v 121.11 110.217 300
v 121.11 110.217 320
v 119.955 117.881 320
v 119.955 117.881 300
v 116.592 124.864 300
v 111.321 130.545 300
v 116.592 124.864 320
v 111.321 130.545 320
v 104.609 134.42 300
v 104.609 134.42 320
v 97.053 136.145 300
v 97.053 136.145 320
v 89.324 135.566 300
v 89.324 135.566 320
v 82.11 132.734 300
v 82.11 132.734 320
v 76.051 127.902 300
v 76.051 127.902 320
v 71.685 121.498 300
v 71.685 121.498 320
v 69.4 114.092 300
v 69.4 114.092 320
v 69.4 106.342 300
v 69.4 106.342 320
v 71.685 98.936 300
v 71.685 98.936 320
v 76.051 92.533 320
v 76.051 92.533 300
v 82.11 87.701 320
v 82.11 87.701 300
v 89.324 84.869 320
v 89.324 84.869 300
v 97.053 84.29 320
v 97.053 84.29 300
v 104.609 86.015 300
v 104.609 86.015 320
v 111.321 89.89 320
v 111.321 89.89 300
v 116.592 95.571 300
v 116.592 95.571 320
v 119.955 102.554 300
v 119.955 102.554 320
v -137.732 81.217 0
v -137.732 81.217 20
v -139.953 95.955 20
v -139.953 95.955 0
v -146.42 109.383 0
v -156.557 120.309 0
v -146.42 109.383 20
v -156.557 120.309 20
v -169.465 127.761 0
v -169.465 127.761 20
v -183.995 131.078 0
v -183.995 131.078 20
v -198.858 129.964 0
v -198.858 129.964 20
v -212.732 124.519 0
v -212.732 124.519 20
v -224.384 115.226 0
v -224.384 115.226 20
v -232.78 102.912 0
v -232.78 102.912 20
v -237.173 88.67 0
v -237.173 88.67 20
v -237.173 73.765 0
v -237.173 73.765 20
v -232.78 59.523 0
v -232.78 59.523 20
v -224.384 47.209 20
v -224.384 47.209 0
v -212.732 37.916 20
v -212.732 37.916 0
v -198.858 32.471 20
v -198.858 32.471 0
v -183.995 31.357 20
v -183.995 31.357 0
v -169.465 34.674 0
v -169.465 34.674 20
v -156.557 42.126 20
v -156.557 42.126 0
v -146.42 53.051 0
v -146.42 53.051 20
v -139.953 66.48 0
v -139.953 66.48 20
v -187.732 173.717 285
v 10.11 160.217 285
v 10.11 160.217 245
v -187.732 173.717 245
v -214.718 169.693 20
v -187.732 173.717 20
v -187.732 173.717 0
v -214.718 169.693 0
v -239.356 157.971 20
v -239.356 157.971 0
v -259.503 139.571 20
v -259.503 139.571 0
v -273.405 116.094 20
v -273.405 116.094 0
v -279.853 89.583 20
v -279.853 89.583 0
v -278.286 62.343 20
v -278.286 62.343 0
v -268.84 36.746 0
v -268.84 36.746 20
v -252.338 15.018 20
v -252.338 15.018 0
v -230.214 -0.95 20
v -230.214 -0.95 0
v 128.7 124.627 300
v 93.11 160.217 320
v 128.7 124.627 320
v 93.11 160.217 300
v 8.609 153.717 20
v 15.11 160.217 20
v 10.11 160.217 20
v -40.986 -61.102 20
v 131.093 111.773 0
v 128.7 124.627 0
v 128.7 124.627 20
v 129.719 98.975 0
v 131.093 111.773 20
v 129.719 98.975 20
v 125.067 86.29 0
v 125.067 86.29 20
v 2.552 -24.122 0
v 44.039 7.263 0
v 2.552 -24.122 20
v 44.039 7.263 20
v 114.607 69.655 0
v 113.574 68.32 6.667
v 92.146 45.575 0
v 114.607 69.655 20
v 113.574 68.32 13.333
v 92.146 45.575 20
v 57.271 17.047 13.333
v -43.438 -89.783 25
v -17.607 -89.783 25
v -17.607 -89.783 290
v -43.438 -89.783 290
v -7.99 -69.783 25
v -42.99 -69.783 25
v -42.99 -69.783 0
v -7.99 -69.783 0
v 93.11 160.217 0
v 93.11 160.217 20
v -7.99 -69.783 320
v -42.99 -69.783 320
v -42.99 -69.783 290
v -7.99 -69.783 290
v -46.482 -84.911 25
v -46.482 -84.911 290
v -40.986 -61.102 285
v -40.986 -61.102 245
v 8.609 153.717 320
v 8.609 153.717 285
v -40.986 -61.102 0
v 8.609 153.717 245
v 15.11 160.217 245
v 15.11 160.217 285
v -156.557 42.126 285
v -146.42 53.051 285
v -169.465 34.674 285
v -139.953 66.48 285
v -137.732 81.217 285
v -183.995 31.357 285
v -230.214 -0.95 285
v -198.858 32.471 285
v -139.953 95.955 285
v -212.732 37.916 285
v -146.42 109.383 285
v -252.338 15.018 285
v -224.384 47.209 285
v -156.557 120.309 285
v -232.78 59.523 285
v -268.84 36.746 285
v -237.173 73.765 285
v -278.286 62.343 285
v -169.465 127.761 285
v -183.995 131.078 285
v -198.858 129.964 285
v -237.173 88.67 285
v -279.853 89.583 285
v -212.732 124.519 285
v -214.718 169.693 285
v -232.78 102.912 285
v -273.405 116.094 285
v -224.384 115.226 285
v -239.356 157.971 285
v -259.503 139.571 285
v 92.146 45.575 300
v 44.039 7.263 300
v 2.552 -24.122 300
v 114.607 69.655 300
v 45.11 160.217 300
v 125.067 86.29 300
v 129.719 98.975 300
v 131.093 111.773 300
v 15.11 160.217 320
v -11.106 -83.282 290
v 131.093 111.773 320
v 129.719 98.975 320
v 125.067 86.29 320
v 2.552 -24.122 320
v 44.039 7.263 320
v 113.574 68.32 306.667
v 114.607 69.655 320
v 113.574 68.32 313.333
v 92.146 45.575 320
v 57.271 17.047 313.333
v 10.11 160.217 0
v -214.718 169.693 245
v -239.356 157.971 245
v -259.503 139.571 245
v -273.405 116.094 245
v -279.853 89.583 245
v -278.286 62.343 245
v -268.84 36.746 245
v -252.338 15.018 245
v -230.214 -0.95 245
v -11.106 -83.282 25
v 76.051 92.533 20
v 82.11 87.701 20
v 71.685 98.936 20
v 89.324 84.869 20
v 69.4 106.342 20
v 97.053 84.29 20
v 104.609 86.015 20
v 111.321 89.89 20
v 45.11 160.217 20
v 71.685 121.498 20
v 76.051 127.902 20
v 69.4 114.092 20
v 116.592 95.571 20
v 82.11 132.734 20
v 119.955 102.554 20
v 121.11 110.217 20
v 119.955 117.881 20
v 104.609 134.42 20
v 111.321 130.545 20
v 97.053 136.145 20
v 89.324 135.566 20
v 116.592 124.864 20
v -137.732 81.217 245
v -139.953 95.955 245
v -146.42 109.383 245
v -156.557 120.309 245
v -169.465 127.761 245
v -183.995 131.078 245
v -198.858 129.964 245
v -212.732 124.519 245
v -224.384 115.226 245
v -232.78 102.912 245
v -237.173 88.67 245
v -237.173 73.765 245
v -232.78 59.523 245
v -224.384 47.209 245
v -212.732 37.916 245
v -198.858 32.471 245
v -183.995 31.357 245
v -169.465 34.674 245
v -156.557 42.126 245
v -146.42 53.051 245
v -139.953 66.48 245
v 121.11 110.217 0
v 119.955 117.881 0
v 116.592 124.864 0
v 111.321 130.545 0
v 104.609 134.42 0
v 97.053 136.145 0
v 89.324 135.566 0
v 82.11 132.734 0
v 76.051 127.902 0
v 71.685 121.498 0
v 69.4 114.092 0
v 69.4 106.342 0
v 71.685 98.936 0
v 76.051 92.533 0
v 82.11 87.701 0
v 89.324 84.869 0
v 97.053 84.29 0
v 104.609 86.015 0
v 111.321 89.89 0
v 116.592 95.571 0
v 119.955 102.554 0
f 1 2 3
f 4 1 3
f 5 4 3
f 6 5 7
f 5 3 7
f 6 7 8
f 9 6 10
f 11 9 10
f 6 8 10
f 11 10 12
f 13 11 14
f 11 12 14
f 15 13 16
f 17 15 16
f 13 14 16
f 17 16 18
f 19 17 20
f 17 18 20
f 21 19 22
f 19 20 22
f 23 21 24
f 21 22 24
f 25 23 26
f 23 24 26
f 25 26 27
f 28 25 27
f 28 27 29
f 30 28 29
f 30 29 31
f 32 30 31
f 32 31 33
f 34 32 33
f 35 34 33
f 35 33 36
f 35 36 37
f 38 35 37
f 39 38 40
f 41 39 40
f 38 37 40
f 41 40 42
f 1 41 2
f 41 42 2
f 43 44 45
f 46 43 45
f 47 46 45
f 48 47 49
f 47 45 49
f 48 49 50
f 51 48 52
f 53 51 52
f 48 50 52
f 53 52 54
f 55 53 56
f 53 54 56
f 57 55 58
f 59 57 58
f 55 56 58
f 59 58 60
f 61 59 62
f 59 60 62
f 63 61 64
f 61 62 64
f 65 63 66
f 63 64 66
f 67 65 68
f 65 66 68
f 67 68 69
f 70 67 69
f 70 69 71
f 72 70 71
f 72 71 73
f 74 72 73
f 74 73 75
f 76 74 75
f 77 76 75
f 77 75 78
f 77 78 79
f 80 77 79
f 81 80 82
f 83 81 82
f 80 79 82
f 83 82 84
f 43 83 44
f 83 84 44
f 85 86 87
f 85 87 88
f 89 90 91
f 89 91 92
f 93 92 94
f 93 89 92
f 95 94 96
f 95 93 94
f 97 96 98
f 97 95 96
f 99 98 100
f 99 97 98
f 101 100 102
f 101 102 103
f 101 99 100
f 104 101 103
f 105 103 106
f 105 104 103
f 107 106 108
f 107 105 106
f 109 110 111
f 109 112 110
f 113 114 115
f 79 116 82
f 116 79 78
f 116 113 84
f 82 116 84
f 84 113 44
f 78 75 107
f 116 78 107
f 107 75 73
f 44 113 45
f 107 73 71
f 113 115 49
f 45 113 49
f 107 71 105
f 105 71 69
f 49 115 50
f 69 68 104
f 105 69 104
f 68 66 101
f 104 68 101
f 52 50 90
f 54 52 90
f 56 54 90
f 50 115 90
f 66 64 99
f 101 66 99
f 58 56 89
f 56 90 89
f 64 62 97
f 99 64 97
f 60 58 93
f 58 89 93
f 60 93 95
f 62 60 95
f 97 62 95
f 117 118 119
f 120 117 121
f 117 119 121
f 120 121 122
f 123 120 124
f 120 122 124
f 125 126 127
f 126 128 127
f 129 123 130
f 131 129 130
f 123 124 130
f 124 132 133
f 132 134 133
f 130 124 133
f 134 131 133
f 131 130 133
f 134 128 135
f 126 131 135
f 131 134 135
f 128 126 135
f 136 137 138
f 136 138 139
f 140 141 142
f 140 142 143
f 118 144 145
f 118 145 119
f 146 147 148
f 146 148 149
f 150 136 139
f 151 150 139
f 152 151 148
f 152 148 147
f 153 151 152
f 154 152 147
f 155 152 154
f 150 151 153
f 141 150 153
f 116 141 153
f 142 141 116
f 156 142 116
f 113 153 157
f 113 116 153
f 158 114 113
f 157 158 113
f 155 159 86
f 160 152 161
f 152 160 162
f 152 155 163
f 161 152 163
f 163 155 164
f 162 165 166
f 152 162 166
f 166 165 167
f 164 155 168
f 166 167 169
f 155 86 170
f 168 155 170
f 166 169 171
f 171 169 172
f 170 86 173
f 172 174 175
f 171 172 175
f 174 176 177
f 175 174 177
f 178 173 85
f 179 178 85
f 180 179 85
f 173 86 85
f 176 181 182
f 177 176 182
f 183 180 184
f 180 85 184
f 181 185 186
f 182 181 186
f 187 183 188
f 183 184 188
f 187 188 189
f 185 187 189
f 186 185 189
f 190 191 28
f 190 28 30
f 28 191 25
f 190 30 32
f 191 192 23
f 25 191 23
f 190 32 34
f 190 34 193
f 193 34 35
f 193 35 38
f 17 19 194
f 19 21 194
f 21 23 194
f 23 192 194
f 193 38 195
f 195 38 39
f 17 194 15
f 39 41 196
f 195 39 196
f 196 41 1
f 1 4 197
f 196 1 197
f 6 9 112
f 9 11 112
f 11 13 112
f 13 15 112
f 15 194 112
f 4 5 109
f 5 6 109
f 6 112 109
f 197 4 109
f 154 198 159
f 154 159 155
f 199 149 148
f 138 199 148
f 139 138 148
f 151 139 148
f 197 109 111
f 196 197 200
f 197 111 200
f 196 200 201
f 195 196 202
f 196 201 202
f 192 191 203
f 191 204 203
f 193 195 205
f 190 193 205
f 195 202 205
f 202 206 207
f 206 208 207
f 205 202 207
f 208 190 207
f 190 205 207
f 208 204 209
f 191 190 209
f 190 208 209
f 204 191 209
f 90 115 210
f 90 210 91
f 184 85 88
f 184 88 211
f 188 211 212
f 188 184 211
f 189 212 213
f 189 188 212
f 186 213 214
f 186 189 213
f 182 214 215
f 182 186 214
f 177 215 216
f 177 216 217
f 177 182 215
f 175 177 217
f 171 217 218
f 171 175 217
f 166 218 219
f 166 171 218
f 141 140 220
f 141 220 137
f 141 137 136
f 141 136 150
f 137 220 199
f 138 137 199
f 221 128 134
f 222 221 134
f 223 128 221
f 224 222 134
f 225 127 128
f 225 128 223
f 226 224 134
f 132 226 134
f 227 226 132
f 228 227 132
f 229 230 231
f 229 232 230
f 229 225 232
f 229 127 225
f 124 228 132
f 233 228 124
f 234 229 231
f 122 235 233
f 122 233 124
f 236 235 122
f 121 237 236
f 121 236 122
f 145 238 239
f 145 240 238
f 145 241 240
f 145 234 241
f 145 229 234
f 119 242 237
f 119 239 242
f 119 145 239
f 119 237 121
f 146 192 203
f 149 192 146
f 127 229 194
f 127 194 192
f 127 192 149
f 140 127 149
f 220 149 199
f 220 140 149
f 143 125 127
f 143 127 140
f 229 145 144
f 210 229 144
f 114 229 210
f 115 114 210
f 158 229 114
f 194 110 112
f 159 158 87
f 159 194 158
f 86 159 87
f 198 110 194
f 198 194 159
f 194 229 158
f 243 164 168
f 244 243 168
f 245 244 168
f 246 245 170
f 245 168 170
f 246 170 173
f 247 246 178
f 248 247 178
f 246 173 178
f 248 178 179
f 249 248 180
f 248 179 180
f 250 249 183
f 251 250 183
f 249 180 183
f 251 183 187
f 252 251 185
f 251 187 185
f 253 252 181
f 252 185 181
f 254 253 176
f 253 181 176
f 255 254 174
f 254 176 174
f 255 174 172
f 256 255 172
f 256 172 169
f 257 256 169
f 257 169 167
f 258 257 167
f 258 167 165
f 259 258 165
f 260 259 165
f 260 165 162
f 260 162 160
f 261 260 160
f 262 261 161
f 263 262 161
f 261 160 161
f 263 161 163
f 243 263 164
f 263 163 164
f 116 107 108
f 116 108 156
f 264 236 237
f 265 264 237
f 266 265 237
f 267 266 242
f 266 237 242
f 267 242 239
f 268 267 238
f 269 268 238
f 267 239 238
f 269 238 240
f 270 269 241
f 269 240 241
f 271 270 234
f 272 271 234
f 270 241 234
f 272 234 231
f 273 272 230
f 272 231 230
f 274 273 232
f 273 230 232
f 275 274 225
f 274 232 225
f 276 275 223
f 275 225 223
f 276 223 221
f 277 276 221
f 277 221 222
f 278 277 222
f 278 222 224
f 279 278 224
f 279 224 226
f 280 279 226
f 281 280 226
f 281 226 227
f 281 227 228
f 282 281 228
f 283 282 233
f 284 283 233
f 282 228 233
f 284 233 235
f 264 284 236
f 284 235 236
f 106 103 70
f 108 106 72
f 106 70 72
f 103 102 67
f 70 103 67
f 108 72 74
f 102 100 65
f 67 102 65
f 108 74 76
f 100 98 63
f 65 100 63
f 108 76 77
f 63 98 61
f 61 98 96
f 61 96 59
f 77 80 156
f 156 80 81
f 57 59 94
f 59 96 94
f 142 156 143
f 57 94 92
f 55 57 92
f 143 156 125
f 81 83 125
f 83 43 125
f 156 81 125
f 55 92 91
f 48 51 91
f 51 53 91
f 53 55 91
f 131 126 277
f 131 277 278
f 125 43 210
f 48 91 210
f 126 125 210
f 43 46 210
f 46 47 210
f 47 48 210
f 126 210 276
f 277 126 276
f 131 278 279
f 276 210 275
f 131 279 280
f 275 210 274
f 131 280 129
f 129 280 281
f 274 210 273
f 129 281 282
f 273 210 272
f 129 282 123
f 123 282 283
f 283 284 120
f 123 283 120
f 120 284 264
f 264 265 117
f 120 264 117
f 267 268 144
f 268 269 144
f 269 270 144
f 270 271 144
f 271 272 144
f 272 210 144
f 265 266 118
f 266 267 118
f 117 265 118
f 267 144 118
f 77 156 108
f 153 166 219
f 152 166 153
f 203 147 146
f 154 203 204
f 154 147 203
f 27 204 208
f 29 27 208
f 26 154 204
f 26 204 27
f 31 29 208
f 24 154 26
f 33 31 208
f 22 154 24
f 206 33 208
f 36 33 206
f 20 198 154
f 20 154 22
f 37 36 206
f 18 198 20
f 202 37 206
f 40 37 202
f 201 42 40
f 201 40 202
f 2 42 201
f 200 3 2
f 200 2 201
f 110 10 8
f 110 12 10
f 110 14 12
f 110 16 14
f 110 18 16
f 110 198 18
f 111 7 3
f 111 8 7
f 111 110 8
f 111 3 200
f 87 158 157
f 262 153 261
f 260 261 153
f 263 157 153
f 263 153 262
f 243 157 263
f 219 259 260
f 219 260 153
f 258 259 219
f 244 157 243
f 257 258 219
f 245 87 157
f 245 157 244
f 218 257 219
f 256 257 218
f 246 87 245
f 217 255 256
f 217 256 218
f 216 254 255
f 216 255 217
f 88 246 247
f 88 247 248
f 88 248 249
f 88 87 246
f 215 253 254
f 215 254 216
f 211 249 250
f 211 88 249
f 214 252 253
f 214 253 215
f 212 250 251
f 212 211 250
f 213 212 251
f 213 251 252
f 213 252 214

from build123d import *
from OCP.BRepFilletAPI import BRepFilletAPI_MakeChamfer

# Parameters (mm, degrees)
BOSS_EXTRU_1_DEPTH      = 320
ENL_V_MAT_EXTRU_1_DEPTH = 30
ENL_V_START             = -295
ENL_V_MAT_EXTRU_2_DEPTH = 25
ESQUISSE5_R             = 26
BOSS_EXTRU_2_DEPTH      = 20
BOSS_EXTRU_3_START      = -35
ESQUISSE5_3_R           = 50
BOSS_EXTRU_3_DEPTH      = 40
BOSS_EXTRU_4_START      = -300
ESQUISSE5_5_R           = 50
BOSS_EXTRU_4_DEPTH      = 20
BOSS_EXTRU_5_START      = -300
ESQUISSE5_6_R           = 26
BOSS_EXTRU_5_DEPTH      = 20
CHANFREIN1_SIZE         = 5
CHANFREIN1_SIZE_2       = 6.671835022
CHANFREIN2_SIZE         = 5
CHANFREIN2_SIZE2        = 6.671835022
CHANFREIN2_SIZE2_2      = 4.169025226
CHAMFER1_START          = 179.129452599
CHAMFER1_OUTLINE_W      = 53
CHAMFER1_OUTLINE_H      = 22
CHAMFER1_DEPTH          = 6.870547401
CHAMFER3_START          = 179.129452599
CHAMFER3_OUTLINE_W      = 53
CHAMFER3_OUTLINE_H      = 22
CHAMFER3_DEPTH          = 6.870547401


with BuildPart() as part:
    # Esquisse1 → Boss.-Extru.1 (new body)
    with BuildSketch(Plane.XY):
        Polygon((10.109909982, 160.217391304), (45.109909982, 160.217391304), (-12.607137799, -89.782608696), (-47.607137799, -89.782608696), align=None)
    extrude(amount=BOSS_EXTRU_1_DEPTH)

    # Esquisse2 → Enlèv. mat.-Extru.1 (cut)
    with BuildSketch(Plane.XY.offset(320)):
        Polygon((-47.607137799, -89.782608696), (-42.989773977, -69.782608696), (-7.989773977, -69.782608696), (-12.607137799, -89.782608696), align=None)
    extrude(amount=-ENL_V_MAT_EXTRU_1_DEPTH, mode=Mode.SUBTRACT)

    # Esquisse3 → Enlèv. mat.-Extru.2 (cut)
    with BuildSketch(Plane.XY.offset(320).offset(ENL_V_START)):
        Polygon((-47.607137799, -89.782608696), (-42.989773977, -69.782608696), (-7.989773977, -69.782608696), (-12.607137799, -89.782608696), align=None)
    extrude(amount=-ENL_V_MAT_EXTRU_2_DEPTH, mode=Mode.SUBTRACT)

    # Esquisse5 → Boss.-Extru.2 (add)
    with BuildSketch(Plane.XY.offset(320)):
        with BuildLine():
            Line((98.109909982, 160.217391304), (45.109909982, 160.217391304))
            Line((45.109909982, 160.217391304), (2.551706555, -24.122440094))
            add(Edge.make_bspline(
                [(98.109909982, 160.217391304), (195.681111268, 92.37740659), (50.514460477, 17.497979542), (2.551706555, -24.122440094)],
                knots=[0, 0, 0, 0, 1, 1, 1, 1], degree=3))
        make_face()
        with Locations((95.109909982, 110.217391304)):
            Circle(ESQUISSE5_R, mode=Mode.SUBTRACT)
    extrude(amount=-BOSS_EXTRU_2_DEPTH)

    # Esquisse5<3> → Boss.-Extru.3 (add)
    with BuildSketch(Plane.XY.offset(320).offset(BOSS_EXTRU_3_START)):
        with BuildLine():
            Line((-230.213971145, -0.950262244), (-40.985726083, -61.102123595))
            Line((-40.985726083, -61.102123595), (10.109909982, 160.217391304))
            Line((10.109909982, 160.217391304), (-187.731895981, 173.717391304))
            ThreePointArc((-187.731895981, 173.717391304), (-277.611698921, 103.077652588), (-230.213971145, -0.950262244))
        make_face()
        with Locations((-187.731895981, 81.217391304)):
            Circle(ESQUISSE5_3_R, mode=Mode.SUBTRACT)
    extrude(amount=-BOSS_EXTRU_3_DEPTH)

    # Esquisse5<5> → Boss.-Extru.4 (add)
    with BuildSketch(Plane.XY.offset(320).offset(BOSS_EXTRU_4_START)):
        with BuildLine():
            Line((-230.213971145, -0.950262244), (-40.985726083, -61.102123595))
            Line((-40.985726083, -61.102123595), (10.109909982, 160.217391304))
            Line((10.109909982, 160.217391304), (-187.731895981, 173.717391304))
            ThreePointArc((-187.731895981, 173.717391304), (-277.611698921, 103.077652588), (-230.213971145, -0.950262244))
        make_face()
        with Locations((-187.731895981, 81.217391304)):
            Circle(ESQUISSE5_5_R, mode=Mode.SUBTRACT)
    extrude(amount=-BOSS_EXTRU_4_DEPTH)

    # Esquisse5<6> → Boss.-Extru.5 (add)
    with BuildSketch(Plane.XY.offset(320).offset(BOSS_EXTRU_5_START)):
        with BuildLine():
            Line((98.109909982, 160.217391304), (45.109909982, 160.217391304))
            Line((45.109909982, 160.217391304), (2.551706555, -24.122440094))
            add(Edge.make_bspline(
                [(98.109909982, 160.217391304), (195.681111268, 92.37740659), (50.514460477, 17.497979542), (2.551706555, -24.122440094)],
                knots=[0, 0, 0, 0, 1, 1, 1, 1], degree=3))
        make_face()
        with Locations((95.109909982, 110.217391304)):
            Circle(ESQUISSE5_6_R, mode=Mode.SUBTRACT)
    extrude(amount=-BOSS_EXTRU_5_DEPTH)

    # Chanfrein1
    # the kernel refuses this chamfer: 6.671835022, 5 mm, written as the material it takes off along each edge
    with BuildSketch(Plane(origin=(10.109909982, 160.217391304, 20), x_dir=(1, 0, 0), z_dir=(0, 0, 1))) as chanfrein1_piece_1:
        Polygon((CHANFREIN1_SIZE, 0), (-CHANFREIN1_SIZE_2 * 0.224951054343, -CHANFREIN1_SIZE_2 * 0.974370064782), (0, 0), align=None)
    extrude(amount=225, mode=Mode.SUBTRACT)
    with BuildSketch(Plane(origin=(10.109909982, 160.217391304, 285), x_dir=(1, 0, 0), z_dir=(0, 0, 1))) as chanfrein1_piece_2:
        Polygon((CHANFREIN1_SIZE, 0), (-CHANFREIN1_SIZE_2 * 0.224951054343, -CHANFREIN1_SIZE_2 * 0.974370064782), (0, 0), align=None)
    extrude(amount=52.24901503, mode=Mode.SUBTRACT)

    # Chanfrein2: one chamfer whose edges measure the first distance from different faces: ONE call of the kernel's chamfer builder (chamfer() names one face for all edges)
    chanfrein2_edges_1 = [part.edges().sort_by_distance(p)[0] for p in [
        (-12.607137799, -89.782608696, 157.5),
    ]]
    chanfrein2_side_1 = [part.faces().sort_by_distance(p)[0] for p in [
        (-30.107137799, -89.782608696, 157.5),
    ]]
    chanfrein2_edges_2 = [part.edges().sort_by_distance(p)[0] for p in [
        (-47.607137799, -89.782608696, 157.5),
    ]]
    chanfrein2_side_2 = [part.faces().sort_by_distance(p)[0] for p in [
        (-19.722598228, 30.998601722, 155.760522115),
    ]]
    chanfrein2 = BRepFilletAPI_MakeChamfer(part.part.solid().wrapped)
    for e in chanfrein2_edges_1:
        chanfrein2.Add(CHANFREIN2_SIZE, CHANFREIN2_SIZE2, e.wrapped, chanfrein2_side_1[0].wrapped)  # the first distance lies on this face
    for e in chanfrein2_edges_2:
        chanfrein2.Add(CHANFREIN2_SIZE, CHANFREIN2_SIZE2_2, e.wrapped, chanfrein2_side_2[0].wrapped)  # the first distance lies on this face
    add(Compound.cast(chanfrein2.Shape()), mode=Mode.REPLACE)

    # Chamfer1: read off the stored shape, not the designer's step
    # Chamfer1 outline → Chamfer1 (cut)
    with BuildSketch(Plane(origin=(0, 0, 0), x_dir=(0.7071067811868629, -0.707106781186232, 0), z_dir=(0.707106781186232, 0.707106781186863, 0)).offset(CHAMFER1_START)):
        with Locations((-22.5, -310)):
            Rectangle(CHAMFER1_OUTLINE_W, CHAMFER1_OUTLINE_H)
    extrude(amount=CHAMFER1_DEPTH, mode=Mode.SUBTRACT)

    # Chamfer3: read off the stored shape, not the designer's step
    # Chamfer3 outline → Chamfer3 (cut)
    with BuildSketch(Plane(origin=(0, 0, 0), x_dir=(0.7071067811868629, -0.707106781186232, 0), z_dir=(0.707106781186232, 0.707106781186863, 0)).offset(CHAMFER3_START)):
        with Locations((-22.5, -10)):
            Rectangle(CHAMFER3_OUTLINE_W, CHAMFER3_OUTLINE_H)
    extrude(amount=CHAMFER3_DEPTH, mode=Mode.SUBTRACT)


solid = part.part
